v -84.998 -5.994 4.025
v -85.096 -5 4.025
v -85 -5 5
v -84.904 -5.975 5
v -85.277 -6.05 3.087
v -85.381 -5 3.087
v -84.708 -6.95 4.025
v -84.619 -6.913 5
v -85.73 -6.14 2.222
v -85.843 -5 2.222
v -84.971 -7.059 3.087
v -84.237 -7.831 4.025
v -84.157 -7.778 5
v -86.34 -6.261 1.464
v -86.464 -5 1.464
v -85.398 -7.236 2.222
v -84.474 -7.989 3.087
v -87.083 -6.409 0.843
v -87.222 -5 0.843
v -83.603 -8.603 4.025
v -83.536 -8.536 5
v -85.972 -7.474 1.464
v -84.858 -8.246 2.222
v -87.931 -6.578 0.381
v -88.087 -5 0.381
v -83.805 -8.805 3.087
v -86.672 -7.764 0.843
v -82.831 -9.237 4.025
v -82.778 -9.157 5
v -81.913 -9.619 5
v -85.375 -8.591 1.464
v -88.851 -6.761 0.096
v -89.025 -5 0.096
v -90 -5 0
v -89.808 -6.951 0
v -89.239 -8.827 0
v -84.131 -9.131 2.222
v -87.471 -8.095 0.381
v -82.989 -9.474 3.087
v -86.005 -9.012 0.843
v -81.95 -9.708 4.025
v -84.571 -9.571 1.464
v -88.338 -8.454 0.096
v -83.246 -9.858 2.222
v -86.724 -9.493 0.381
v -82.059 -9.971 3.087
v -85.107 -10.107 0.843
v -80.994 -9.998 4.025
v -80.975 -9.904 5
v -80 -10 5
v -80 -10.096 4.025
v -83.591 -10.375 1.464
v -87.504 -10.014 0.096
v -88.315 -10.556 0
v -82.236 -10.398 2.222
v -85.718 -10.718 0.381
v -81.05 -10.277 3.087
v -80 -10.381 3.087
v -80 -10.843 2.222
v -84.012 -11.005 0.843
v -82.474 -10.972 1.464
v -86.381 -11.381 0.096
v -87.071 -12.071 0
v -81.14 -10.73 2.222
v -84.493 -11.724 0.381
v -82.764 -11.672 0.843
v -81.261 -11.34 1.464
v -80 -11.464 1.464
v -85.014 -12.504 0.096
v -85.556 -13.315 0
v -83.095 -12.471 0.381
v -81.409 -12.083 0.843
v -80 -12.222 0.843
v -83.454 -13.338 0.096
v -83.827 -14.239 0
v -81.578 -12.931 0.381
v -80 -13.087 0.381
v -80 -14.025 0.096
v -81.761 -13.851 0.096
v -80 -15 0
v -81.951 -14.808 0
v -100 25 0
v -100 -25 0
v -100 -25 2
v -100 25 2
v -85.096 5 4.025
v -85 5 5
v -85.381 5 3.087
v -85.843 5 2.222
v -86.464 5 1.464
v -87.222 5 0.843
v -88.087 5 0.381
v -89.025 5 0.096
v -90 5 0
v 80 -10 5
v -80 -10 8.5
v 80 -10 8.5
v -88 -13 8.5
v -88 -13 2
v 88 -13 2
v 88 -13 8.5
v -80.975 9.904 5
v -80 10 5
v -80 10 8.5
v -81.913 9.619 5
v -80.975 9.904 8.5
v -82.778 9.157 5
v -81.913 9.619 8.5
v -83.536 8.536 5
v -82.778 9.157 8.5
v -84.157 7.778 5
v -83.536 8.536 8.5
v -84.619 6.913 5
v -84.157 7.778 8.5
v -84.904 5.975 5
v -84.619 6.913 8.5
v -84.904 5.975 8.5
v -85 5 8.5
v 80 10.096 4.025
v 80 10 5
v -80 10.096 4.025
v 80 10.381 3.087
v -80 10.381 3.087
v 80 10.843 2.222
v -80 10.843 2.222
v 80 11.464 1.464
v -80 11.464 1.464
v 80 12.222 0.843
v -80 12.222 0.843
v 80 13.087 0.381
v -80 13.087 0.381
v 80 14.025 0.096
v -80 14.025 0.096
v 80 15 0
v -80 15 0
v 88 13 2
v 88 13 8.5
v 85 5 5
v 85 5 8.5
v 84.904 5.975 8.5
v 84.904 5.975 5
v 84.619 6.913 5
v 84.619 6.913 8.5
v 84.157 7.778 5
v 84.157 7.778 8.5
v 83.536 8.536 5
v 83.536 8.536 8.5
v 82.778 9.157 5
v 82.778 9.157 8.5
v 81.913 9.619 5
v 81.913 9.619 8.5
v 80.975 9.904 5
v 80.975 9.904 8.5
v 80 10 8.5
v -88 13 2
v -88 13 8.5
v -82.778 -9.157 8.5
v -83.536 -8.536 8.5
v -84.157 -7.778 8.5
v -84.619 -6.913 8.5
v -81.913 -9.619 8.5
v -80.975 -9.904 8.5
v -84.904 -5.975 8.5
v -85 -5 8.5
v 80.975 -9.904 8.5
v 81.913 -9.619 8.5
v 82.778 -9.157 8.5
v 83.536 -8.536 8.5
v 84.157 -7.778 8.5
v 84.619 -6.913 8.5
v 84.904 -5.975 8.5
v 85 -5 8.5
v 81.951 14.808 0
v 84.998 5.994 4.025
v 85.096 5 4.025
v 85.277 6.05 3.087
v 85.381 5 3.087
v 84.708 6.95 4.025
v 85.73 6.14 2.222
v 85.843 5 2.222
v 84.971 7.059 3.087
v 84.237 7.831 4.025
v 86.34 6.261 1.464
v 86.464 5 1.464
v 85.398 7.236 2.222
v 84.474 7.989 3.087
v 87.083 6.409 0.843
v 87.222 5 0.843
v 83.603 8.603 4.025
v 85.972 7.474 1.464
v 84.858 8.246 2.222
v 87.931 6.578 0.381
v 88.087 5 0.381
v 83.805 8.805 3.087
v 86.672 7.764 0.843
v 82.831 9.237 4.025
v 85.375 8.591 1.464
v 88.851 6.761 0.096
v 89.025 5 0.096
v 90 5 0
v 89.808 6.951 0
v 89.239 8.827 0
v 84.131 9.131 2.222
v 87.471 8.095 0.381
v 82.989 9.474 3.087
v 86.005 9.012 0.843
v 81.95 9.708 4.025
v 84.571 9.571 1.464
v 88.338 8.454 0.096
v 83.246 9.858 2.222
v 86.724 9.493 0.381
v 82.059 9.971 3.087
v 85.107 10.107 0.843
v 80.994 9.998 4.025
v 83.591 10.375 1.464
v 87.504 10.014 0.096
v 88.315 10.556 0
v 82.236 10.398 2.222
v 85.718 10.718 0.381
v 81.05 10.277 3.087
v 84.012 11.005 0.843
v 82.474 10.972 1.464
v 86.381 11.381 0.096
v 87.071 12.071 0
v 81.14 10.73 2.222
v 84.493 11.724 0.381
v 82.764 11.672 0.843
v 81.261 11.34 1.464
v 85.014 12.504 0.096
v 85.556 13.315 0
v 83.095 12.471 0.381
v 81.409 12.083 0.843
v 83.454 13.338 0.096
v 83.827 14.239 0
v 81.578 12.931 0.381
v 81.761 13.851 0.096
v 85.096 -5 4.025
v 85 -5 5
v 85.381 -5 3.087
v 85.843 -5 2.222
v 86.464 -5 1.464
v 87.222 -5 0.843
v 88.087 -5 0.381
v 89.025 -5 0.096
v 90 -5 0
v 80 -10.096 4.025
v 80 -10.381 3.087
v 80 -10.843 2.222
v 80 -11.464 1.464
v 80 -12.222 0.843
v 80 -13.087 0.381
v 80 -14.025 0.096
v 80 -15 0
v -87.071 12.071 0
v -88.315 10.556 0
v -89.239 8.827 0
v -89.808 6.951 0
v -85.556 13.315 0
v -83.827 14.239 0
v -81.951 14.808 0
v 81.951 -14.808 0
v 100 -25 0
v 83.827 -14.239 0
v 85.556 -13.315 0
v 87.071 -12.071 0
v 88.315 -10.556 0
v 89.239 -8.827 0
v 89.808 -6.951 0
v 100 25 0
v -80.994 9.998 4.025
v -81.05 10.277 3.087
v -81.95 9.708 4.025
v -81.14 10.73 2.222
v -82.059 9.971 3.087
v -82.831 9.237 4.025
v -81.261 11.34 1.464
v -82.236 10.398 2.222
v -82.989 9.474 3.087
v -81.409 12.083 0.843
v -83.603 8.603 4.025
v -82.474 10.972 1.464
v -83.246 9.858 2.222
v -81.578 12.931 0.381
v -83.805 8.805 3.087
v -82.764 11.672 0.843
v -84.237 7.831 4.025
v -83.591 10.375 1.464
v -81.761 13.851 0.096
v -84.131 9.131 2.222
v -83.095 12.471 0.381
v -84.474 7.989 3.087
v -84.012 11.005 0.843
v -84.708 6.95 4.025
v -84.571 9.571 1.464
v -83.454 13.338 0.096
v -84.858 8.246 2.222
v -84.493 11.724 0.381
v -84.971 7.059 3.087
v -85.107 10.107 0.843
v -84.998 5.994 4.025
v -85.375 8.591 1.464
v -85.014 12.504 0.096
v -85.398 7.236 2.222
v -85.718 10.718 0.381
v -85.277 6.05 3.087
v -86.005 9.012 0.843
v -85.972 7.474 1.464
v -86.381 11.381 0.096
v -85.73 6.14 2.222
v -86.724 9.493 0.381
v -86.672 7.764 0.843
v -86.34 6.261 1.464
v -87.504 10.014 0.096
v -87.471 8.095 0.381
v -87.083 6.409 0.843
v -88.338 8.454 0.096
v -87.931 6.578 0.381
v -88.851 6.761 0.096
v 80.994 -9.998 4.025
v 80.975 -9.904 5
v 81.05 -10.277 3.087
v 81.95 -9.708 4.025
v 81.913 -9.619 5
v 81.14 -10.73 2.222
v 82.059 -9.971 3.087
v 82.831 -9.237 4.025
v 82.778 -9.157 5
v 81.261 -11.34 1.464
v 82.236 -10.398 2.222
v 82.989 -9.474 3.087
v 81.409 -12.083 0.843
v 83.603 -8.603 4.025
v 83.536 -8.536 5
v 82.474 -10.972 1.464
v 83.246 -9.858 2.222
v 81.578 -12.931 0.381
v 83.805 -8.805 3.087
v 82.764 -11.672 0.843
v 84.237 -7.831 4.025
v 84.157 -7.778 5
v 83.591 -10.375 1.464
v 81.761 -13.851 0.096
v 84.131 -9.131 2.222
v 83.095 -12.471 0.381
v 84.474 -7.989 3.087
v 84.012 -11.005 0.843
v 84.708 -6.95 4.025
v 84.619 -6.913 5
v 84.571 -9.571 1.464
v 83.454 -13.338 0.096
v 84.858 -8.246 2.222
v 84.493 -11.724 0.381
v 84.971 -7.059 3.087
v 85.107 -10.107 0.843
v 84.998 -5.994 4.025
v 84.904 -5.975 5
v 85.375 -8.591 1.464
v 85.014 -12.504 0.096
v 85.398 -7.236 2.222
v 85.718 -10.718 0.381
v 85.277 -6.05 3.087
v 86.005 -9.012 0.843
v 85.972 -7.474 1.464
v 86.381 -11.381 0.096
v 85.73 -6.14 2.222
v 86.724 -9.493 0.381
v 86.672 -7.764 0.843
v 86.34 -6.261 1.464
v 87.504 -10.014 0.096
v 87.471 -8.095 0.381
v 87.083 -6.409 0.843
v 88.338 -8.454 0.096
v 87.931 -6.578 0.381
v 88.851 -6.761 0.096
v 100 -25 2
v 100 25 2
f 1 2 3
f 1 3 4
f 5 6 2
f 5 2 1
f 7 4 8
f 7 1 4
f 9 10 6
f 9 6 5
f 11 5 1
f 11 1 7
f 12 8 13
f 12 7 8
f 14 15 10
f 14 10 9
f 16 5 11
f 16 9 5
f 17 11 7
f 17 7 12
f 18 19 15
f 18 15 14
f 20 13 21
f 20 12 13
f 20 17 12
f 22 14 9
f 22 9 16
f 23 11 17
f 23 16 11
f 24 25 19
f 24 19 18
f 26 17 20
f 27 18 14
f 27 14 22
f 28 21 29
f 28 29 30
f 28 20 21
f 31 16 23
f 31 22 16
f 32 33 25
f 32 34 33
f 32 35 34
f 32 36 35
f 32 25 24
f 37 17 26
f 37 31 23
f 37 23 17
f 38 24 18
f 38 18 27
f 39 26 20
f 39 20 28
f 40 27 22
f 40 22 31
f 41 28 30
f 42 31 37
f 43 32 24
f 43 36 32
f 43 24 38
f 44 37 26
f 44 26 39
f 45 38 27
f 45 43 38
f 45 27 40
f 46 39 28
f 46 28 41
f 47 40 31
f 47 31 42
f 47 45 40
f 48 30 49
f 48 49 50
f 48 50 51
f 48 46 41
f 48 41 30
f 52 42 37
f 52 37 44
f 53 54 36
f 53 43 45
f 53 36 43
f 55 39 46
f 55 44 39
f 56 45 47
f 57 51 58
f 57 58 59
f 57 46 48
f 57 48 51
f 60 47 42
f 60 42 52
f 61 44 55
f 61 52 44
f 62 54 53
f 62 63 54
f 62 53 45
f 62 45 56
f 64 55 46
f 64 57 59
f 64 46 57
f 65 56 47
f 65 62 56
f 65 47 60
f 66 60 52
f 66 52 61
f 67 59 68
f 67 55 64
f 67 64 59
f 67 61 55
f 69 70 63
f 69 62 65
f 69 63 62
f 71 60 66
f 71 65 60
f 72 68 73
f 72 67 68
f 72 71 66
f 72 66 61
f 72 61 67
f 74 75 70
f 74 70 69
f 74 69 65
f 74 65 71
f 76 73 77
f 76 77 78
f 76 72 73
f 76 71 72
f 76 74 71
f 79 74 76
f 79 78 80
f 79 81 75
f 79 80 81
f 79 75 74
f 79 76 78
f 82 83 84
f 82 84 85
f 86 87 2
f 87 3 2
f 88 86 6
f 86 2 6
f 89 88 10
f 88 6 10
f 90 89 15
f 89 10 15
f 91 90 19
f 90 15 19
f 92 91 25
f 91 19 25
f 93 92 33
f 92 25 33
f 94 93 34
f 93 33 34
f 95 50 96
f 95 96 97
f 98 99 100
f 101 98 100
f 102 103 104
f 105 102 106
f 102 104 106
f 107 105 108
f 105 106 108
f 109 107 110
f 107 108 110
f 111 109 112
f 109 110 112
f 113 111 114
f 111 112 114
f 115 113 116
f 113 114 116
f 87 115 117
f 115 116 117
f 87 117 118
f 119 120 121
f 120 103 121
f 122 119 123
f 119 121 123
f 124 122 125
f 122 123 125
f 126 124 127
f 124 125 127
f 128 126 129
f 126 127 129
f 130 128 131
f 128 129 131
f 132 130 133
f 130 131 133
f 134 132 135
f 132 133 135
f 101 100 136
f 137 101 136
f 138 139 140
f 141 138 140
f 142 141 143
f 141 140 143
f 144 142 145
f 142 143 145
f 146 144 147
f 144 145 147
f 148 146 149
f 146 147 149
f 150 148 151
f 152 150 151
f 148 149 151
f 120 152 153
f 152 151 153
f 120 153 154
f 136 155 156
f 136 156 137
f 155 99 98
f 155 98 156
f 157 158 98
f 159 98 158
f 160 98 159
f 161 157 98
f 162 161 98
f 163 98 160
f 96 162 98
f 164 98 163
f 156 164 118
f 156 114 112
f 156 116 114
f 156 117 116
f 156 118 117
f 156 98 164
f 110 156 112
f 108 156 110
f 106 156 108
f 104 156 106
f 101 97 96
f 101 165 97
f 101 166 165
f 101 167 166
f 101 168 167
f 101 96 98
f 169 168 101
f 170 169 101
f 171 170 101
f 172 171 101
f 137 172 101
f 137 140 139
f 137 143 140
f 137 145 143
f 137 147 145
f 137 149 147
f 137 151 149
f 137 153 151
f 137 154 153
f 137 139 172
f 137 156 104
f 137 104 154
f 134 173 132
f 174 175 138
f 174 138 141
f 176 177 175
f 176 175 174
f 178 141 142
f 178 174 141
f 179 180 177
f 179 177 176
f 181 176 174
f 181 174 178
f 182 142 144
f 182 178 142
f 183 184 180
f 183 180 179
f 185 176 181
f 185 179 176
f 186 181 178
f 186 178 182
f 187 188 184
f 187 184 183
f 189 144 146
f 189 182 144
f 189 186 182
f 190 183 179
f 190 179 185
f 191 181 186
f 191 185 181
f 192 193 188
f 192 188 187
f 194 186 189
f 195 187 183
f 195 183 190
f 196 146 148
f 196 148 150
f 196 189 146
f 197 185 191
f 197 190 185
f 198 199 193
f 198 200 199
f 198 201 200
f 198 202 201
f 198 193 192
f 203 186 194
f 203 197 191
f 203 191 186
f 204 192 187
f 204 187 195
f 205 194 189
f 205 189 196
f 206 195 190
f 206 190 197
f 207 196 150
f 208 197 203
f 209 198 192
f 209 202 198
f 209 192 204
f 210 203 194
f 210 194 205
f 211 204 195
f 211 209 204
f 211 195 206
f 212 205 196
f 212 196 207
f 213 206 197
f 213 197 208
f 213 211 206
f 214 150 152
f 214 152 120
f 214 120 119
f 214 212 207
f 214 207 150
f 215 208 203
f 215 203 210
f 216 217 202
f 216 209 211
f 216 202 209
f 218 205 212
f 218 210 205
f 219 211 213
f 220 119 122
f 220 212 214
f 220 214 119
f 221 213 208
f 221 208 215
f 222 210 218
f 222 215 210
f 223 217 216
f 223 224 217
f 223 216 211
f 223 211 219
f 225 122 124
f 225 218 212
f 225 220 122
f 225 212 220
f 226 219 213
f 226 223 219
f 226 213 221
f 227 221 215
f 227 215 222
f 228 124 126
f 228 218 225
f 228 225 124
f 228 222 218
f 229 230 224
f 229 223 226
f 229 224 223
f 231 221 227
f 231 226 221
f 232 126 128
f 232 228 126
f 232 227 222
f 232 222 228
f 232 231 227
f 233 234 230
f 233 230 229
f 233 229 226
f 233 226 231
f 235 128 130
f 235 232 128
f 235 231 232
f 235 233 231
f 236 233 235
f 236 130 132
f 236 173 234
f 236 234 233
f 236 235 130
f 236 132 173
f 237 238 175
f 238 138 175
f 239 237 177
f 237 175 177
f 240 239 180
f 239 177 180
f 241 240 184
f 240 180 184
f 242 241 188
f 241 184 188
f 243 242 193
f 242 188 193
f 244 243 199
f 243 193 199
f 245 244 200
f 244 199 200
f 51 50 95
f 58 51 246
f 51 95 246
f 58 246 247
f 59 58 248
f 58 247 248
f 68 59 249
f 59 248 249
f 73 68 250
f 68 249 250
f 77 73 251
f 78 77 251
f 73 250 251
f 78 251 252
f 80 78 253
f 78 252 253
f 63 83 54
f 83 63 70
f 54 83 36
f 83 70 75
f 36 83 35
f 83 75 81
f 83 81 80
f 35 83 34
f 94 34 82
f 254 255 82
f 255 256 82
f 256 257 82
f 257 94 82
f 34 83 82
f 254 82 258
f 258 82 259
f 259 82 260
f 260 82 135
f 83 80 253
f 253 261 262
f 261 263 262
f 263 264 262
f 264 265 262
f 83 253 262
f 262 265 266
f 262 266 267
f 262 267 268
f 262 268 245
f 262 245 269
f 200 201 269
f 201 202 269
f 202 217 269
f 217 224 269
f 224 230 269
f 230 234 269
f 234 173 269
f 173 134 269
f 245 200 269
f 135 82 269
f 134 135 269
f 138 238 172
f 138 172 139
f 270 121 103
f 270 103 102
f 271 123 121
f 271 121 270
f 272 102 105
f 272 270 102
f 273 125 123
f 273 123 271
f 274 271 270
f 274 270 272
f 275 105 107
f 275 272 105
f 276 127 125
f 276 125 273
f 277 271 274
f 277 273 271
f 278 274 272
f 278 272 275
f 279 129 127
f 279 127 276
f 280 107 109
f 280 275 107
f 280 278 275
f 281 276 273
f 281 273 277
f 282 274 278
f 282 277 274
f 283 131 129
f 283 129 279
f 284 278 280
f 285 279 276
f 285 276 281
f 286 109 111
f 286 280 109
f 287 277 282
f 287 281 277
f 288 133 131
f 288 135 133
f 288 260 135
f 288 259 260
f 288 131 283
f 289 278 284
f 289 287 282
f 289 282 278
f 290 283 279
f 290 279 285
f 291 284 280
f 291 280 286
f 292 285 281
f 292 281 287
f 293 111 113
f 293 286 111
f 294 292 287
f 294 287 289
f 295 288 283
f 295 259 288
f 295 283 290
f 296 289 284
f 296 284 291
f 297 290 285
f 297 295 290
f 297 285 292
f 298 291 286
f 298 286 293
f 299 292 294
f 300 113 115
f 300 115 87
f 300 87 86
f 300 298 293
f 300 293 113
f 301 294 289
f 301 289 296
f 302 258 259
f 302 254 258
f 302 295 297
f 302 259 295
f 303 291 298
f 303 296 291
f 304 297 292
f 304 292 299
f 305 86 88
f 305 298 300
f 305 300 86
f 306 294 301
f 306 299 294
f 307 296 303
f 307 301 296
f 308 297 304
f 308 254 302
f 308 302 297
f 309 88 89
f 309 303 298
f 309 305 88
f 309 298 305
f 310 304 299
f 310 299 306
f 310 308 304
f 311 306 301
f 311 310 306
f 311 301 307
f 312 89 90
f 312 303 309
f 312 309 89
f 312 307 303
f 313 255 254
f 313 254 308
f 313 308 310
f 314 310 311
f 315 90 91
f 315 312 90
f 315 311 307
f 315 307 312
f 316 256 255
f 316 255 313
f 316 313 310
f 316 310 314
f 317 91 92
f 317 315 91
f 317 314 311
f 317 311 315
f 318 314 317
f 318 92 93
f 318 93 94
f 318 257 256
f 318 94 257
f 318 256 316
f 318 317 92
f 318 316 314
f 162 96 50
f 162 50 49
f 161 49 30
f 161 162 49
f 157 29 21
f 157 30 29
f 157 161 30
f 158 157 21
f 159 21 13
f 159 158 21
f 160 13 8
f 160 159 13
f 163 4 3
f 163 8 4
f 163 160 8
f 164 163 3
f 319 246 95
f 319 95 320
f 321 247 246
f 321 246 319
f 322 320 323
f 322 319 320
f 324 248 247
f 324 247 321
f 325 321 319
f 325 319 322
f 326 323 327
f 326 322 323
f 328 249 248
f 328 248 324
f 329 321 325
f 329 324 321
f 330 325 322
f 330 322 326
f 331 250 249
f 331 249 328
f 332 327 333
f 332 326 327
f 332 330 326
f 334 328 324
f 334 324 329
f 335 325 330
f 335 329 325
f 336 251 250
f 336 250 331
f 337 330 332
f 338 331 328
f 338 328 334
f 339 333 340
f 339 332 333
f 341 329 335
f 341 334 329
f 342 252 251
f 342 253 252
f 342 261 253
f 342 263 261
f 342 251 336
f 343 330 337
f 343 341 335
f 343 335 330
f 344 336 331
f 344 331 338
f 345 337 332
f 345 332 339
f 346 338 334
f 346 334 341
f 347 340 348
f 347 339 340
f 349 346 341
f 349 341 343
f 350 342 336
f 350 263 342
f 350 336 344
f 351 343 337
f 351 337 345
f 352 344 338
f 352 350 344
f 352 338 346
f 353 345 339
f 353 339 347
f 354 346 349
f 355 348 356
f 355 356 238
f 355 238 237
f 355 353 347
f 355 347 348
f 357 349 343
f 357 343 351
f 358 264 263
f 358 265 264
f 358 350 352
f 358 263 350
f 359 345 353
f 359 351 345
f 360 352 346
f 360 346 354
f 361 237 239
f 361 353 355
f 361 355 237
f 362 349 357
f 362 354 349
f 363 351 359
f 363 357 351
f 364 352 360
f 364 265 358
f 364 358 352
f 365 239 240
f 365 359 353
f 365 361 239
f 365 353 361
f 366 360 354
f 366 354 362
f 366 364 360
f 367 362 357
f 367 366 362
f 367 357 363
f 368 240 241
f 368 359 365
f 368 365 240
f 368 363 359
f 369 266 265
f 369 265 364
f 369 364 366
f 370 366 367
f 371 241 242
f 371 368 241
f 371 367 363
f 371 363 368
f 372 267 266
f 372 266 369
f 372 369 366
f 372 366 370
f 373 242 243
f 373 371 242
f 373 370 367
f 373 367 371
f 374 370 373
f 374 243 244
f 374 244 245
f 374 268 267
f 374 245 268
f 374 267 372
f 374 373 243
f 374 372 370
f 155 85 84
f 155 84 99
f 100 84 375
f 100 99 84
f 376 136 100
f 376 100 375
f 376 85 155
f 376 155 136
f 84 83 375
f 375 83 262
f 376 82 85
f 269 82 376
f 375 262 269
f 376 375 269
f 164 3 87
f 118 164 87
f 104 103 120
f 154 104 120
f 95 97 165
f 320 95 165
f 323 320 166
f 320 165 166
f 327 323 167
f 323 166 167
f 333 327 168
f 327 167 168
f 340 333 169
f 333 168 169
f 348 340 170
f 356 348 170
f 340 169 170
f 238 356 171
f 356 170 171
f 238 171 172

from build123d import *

# Parameters (mm, degrees)
F0_W     = 176
F0_H     = 26
F0_W_2   = 170
F0_H_2   = 20
F0_W_3   = 200
F0_H_3   = 50
F1_DEPTH = 2
F2_DEPTH = 8.5
F3_R     = 5
F4_R     = 5


with BuildPart() as f1:
    # F0 (on Top) → F1 (new body)
    with BuildSketch(Plane.XY):
        Rectangle(F0_W, F0_H)
        Rectangle(F0_W_2, F0_H_2, mode=Mode.SUBTRACT)
        Rectangle(F0_W_3, F0_H_3)
        Rectangle(F0_W, F0_H, mode=Mode.SUBTRACT)
    extrude(amount=F1_DEPTH)

    # F0 (on Top) → F2 (join)
    with BuildSketch(Plane.XY):
        Rectangle(F0_W, F0_H)
        Rectangle(F0_W_2, F0_H_2, mode=Mode.SUBTRACT)
    extrude(amount=F2_DEPTH)

    # F3
    f3_edges = [f1.edges().sort_by_distance(p)[0] for p in [
        (-85, -10, 4.25),
        (-85, 10, 4.25),
        (85, -10, 4.25),
        (85, 10, 4.25),
    ]]
    fillet(f3_edges, radius=F3_R)

    # F4
    f4_edges = [f1.edges().sort_by_distance(p)[0] for p in [
        (0, -10, 0),
    ]]
    fillet(f4_edges, radius=F4_R)


solid = f1.part
